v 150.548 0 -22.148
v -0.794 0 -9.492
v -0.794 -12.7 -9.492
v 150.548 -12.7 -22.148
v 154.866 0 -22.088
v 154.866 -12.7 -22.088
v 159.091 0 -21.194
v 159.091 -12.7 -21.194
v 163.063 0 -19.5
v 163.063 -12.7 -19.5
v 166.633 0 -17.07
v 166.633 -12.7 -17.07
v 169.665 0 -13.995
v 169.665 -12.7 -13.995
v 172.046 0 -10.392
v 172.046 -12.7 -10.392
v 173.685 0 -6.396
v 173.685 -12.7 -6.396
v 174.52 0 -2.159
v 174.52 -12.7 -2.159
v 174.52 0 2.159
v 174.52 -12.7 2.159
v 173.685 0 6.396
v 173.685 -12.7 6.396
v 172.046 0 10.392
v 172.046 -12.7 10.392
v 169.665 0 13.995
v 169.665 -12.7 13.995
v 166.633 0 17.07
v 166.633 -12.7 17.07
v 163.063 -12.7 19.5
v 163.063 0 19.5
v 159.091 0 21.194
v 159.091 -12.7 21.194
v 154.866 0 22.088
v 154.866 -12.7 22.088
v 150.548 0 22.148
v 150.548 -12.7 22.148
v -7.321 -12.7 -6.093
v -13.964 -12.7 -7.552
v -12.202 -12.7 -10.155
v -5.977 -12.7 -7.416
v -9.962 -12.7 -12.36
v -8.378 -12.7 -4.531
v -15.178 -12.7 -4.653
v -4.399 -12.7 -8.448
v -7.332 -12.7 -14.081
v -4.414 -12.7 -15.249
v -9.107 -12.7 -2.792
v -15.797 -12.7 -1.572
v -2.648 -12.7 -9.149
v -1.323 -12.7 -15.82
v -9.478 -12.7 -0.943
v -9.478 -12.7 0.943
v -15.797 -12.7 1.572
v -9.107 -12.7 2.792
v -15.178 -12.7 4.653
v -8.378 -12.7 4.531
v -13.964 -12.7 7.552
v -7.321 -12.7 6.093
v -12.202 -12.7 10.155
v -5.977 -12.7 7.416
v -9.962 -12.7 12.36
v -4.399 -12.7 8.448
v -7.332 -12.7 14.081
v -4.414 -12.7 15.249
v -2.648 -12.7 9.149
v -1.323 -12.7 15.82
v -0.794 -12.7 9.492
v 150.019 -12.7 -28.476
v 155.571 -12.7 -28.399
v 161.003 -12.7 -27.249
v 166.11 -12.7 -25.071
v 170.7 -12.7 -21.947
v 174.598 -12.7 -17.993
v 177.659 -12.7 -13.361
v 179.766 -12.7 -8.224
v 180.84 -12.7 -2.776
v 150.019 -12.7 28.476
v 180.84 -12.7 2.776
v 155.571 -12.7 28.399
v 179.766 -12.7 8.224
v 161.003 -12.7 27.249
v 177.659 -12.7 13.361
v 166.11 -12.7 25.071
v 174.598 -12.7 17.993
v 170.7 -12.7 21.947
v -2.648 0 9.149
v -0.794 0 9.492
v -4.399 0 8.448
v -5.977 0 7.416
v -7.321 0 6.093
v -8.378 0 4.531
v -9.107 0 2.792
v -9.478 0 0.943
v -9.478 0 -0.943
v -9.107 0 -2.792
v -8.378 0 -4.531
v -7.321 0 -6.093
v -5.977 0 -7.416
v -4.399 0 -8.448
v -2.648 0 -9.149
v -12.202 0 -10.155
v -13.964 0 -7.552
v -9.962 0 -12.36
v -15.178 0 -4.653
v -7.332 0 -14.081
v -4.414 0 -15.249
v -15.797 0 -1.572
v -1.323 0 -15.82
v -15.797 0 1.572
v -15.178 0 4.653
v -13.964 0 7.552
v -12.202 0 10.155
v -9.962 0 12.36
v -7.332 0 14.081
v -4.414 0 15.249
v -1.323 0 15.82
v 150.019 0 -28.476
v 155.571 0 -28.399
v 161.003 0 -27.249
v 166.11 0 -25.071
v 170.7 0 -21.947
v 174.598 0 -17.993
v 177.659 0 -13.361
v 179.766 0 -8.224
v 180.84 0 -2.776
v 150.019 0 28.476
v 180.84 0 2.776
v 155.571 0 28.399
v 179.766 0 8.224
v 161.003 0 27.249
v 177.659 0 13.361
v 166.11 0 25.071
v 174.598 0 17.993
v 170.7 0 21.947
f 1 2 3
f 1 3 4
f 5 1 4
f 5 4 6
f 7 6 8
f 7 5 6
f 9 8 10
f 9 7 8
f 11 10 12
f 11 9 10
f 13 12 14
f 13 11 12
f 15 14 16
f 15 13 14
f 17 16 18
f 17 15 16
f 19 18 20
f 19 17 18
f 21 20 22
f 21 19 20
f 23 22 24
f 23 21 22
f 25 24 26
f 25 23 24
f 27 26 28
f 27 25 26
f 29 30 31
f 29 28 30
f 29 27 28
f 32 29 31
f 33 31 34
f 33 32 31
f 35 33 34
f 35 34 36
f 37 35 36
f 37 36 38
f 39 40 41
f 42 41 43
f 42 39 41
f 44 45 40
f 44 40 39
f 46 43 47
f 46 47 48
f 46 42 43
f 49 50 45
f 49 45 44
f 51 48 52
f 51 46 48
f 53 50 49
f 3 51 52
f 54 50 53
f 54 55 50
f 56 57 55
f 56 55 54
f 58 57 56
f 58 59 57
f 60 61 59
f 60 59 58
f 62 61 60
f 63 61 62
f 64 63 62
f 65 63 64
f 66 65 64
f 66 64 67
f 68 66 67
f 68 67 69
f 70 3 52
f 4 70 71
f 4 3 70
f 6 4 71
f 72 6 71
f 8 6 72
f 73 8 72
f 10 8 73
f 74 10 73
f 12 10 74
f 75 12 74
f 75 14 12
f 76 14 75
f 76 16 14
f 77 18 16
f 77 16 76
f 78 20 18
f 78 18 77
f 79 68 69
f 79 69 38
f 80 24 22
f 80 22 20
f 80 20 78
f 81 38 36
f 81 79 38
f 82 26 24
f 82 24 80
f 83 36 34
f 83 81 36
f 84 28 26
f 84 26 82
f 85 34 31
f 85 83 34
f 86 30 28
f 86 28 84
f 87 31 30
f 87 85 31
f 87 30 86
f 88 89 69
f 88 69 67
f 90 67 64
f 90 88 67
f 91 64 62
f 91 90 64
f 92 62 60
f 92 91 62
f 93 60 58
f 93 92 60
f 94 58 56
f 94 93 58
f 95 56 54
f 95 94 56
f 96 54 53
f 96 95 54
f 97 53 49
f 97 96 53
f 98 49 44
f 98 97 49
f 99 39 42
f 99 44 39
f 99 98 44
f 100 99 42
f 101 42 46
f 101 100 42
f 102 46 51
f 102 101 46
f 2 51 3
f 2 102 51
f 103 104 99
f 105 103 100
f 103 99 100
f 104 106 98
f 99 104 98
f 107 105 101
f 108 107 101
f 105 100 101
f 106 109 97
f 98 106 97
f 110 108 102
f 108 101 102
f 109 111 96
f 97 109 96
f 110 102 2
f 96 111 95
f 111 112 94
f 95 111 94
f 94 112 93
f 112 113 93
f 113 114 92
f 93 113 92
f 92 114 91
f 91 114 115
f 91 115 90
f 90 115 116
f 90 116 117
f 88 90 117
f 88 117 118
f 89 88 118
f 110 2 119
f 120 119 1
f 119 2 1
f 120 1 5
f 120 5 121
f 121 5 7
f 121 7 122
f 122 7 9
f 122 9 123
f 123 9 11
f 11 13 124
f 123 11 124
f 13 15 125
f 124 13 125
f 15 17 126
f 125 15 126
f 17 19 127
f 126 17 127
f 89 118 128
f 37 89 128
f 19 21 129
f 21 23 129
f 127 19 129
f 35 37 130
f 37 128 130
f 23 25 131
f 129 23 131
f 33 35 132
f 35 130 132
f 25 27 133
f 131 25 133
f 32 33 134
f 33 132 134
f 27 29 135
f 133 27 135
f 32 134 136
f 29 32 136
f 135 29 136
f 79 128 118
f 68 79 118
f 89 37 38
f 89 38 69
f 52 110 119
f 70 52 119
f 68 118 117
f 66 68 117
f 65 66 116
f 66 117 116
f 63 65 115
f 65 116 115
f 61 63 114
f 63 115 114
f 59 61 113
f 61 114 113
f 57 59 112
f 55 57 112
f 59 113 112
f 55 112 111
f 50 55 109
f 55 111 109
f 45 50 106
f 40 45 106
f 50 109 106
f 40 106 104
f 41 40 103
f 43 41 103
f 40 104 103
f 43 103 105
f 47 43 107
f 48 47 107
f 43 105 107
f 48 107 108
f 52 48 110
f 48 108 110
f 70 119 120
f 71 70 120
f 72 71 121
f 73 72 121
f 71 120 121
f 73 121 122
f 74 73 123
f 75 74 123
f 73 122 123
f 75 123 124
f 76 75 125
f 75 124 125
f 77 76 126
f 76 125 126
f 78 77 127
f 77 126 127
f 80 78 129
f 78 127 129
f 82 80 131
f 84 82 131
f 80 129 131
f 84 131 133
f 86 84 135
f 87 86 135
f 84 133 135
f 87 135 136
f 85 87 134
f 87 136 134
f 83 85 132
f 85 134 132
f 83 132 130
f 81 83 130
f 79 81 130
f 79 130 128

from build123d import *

# Parameters (mm, degrees)
F2_DEPTH = 12.7
F3_DEPTH = 25.4


with BuildPart() as f2:
    # F1 (on Front) → F2 (new body)
    with BuildSketch(Plane.XZ):
        with BuildLine():
            Line((150.01875, 28.475608), (-1.322917, 15.819782))
            ThreePointArc((-1.322917, 15.819782), (-15.874999, 0), (-1.322917, -15.819782))
            Line((-1.322917, -15.819782), (150.01875, -28.475608))
            ThreePointArc((150.01875, -28.475608), (180.974999, 0), (150.01875, 28.475608))
        make_face()
    extrude(amount=F2_DEPTH)

    # F0 (on Front) → F3 (cut)
    with BuildSketch(Plane.XZ):
        with BuildLine():
            Line((150.547917, 22.147695), (-0.79375, 9.491869))
            ThreePointArc((-0.79375, 9.491869), (-9.525, 0), (-0.79375, -9.491869))
            Line((-0.79375, -9.491869), (150.547917, -22.147695))
            ThreePointArc((150.547917, -22.147695), (174.625, 0), (150.547917, 22.147695))
        make_face()
    extrude(amount=F3_DEPTH, mode=Mode.SUBTRACT)


solid = f2.part
